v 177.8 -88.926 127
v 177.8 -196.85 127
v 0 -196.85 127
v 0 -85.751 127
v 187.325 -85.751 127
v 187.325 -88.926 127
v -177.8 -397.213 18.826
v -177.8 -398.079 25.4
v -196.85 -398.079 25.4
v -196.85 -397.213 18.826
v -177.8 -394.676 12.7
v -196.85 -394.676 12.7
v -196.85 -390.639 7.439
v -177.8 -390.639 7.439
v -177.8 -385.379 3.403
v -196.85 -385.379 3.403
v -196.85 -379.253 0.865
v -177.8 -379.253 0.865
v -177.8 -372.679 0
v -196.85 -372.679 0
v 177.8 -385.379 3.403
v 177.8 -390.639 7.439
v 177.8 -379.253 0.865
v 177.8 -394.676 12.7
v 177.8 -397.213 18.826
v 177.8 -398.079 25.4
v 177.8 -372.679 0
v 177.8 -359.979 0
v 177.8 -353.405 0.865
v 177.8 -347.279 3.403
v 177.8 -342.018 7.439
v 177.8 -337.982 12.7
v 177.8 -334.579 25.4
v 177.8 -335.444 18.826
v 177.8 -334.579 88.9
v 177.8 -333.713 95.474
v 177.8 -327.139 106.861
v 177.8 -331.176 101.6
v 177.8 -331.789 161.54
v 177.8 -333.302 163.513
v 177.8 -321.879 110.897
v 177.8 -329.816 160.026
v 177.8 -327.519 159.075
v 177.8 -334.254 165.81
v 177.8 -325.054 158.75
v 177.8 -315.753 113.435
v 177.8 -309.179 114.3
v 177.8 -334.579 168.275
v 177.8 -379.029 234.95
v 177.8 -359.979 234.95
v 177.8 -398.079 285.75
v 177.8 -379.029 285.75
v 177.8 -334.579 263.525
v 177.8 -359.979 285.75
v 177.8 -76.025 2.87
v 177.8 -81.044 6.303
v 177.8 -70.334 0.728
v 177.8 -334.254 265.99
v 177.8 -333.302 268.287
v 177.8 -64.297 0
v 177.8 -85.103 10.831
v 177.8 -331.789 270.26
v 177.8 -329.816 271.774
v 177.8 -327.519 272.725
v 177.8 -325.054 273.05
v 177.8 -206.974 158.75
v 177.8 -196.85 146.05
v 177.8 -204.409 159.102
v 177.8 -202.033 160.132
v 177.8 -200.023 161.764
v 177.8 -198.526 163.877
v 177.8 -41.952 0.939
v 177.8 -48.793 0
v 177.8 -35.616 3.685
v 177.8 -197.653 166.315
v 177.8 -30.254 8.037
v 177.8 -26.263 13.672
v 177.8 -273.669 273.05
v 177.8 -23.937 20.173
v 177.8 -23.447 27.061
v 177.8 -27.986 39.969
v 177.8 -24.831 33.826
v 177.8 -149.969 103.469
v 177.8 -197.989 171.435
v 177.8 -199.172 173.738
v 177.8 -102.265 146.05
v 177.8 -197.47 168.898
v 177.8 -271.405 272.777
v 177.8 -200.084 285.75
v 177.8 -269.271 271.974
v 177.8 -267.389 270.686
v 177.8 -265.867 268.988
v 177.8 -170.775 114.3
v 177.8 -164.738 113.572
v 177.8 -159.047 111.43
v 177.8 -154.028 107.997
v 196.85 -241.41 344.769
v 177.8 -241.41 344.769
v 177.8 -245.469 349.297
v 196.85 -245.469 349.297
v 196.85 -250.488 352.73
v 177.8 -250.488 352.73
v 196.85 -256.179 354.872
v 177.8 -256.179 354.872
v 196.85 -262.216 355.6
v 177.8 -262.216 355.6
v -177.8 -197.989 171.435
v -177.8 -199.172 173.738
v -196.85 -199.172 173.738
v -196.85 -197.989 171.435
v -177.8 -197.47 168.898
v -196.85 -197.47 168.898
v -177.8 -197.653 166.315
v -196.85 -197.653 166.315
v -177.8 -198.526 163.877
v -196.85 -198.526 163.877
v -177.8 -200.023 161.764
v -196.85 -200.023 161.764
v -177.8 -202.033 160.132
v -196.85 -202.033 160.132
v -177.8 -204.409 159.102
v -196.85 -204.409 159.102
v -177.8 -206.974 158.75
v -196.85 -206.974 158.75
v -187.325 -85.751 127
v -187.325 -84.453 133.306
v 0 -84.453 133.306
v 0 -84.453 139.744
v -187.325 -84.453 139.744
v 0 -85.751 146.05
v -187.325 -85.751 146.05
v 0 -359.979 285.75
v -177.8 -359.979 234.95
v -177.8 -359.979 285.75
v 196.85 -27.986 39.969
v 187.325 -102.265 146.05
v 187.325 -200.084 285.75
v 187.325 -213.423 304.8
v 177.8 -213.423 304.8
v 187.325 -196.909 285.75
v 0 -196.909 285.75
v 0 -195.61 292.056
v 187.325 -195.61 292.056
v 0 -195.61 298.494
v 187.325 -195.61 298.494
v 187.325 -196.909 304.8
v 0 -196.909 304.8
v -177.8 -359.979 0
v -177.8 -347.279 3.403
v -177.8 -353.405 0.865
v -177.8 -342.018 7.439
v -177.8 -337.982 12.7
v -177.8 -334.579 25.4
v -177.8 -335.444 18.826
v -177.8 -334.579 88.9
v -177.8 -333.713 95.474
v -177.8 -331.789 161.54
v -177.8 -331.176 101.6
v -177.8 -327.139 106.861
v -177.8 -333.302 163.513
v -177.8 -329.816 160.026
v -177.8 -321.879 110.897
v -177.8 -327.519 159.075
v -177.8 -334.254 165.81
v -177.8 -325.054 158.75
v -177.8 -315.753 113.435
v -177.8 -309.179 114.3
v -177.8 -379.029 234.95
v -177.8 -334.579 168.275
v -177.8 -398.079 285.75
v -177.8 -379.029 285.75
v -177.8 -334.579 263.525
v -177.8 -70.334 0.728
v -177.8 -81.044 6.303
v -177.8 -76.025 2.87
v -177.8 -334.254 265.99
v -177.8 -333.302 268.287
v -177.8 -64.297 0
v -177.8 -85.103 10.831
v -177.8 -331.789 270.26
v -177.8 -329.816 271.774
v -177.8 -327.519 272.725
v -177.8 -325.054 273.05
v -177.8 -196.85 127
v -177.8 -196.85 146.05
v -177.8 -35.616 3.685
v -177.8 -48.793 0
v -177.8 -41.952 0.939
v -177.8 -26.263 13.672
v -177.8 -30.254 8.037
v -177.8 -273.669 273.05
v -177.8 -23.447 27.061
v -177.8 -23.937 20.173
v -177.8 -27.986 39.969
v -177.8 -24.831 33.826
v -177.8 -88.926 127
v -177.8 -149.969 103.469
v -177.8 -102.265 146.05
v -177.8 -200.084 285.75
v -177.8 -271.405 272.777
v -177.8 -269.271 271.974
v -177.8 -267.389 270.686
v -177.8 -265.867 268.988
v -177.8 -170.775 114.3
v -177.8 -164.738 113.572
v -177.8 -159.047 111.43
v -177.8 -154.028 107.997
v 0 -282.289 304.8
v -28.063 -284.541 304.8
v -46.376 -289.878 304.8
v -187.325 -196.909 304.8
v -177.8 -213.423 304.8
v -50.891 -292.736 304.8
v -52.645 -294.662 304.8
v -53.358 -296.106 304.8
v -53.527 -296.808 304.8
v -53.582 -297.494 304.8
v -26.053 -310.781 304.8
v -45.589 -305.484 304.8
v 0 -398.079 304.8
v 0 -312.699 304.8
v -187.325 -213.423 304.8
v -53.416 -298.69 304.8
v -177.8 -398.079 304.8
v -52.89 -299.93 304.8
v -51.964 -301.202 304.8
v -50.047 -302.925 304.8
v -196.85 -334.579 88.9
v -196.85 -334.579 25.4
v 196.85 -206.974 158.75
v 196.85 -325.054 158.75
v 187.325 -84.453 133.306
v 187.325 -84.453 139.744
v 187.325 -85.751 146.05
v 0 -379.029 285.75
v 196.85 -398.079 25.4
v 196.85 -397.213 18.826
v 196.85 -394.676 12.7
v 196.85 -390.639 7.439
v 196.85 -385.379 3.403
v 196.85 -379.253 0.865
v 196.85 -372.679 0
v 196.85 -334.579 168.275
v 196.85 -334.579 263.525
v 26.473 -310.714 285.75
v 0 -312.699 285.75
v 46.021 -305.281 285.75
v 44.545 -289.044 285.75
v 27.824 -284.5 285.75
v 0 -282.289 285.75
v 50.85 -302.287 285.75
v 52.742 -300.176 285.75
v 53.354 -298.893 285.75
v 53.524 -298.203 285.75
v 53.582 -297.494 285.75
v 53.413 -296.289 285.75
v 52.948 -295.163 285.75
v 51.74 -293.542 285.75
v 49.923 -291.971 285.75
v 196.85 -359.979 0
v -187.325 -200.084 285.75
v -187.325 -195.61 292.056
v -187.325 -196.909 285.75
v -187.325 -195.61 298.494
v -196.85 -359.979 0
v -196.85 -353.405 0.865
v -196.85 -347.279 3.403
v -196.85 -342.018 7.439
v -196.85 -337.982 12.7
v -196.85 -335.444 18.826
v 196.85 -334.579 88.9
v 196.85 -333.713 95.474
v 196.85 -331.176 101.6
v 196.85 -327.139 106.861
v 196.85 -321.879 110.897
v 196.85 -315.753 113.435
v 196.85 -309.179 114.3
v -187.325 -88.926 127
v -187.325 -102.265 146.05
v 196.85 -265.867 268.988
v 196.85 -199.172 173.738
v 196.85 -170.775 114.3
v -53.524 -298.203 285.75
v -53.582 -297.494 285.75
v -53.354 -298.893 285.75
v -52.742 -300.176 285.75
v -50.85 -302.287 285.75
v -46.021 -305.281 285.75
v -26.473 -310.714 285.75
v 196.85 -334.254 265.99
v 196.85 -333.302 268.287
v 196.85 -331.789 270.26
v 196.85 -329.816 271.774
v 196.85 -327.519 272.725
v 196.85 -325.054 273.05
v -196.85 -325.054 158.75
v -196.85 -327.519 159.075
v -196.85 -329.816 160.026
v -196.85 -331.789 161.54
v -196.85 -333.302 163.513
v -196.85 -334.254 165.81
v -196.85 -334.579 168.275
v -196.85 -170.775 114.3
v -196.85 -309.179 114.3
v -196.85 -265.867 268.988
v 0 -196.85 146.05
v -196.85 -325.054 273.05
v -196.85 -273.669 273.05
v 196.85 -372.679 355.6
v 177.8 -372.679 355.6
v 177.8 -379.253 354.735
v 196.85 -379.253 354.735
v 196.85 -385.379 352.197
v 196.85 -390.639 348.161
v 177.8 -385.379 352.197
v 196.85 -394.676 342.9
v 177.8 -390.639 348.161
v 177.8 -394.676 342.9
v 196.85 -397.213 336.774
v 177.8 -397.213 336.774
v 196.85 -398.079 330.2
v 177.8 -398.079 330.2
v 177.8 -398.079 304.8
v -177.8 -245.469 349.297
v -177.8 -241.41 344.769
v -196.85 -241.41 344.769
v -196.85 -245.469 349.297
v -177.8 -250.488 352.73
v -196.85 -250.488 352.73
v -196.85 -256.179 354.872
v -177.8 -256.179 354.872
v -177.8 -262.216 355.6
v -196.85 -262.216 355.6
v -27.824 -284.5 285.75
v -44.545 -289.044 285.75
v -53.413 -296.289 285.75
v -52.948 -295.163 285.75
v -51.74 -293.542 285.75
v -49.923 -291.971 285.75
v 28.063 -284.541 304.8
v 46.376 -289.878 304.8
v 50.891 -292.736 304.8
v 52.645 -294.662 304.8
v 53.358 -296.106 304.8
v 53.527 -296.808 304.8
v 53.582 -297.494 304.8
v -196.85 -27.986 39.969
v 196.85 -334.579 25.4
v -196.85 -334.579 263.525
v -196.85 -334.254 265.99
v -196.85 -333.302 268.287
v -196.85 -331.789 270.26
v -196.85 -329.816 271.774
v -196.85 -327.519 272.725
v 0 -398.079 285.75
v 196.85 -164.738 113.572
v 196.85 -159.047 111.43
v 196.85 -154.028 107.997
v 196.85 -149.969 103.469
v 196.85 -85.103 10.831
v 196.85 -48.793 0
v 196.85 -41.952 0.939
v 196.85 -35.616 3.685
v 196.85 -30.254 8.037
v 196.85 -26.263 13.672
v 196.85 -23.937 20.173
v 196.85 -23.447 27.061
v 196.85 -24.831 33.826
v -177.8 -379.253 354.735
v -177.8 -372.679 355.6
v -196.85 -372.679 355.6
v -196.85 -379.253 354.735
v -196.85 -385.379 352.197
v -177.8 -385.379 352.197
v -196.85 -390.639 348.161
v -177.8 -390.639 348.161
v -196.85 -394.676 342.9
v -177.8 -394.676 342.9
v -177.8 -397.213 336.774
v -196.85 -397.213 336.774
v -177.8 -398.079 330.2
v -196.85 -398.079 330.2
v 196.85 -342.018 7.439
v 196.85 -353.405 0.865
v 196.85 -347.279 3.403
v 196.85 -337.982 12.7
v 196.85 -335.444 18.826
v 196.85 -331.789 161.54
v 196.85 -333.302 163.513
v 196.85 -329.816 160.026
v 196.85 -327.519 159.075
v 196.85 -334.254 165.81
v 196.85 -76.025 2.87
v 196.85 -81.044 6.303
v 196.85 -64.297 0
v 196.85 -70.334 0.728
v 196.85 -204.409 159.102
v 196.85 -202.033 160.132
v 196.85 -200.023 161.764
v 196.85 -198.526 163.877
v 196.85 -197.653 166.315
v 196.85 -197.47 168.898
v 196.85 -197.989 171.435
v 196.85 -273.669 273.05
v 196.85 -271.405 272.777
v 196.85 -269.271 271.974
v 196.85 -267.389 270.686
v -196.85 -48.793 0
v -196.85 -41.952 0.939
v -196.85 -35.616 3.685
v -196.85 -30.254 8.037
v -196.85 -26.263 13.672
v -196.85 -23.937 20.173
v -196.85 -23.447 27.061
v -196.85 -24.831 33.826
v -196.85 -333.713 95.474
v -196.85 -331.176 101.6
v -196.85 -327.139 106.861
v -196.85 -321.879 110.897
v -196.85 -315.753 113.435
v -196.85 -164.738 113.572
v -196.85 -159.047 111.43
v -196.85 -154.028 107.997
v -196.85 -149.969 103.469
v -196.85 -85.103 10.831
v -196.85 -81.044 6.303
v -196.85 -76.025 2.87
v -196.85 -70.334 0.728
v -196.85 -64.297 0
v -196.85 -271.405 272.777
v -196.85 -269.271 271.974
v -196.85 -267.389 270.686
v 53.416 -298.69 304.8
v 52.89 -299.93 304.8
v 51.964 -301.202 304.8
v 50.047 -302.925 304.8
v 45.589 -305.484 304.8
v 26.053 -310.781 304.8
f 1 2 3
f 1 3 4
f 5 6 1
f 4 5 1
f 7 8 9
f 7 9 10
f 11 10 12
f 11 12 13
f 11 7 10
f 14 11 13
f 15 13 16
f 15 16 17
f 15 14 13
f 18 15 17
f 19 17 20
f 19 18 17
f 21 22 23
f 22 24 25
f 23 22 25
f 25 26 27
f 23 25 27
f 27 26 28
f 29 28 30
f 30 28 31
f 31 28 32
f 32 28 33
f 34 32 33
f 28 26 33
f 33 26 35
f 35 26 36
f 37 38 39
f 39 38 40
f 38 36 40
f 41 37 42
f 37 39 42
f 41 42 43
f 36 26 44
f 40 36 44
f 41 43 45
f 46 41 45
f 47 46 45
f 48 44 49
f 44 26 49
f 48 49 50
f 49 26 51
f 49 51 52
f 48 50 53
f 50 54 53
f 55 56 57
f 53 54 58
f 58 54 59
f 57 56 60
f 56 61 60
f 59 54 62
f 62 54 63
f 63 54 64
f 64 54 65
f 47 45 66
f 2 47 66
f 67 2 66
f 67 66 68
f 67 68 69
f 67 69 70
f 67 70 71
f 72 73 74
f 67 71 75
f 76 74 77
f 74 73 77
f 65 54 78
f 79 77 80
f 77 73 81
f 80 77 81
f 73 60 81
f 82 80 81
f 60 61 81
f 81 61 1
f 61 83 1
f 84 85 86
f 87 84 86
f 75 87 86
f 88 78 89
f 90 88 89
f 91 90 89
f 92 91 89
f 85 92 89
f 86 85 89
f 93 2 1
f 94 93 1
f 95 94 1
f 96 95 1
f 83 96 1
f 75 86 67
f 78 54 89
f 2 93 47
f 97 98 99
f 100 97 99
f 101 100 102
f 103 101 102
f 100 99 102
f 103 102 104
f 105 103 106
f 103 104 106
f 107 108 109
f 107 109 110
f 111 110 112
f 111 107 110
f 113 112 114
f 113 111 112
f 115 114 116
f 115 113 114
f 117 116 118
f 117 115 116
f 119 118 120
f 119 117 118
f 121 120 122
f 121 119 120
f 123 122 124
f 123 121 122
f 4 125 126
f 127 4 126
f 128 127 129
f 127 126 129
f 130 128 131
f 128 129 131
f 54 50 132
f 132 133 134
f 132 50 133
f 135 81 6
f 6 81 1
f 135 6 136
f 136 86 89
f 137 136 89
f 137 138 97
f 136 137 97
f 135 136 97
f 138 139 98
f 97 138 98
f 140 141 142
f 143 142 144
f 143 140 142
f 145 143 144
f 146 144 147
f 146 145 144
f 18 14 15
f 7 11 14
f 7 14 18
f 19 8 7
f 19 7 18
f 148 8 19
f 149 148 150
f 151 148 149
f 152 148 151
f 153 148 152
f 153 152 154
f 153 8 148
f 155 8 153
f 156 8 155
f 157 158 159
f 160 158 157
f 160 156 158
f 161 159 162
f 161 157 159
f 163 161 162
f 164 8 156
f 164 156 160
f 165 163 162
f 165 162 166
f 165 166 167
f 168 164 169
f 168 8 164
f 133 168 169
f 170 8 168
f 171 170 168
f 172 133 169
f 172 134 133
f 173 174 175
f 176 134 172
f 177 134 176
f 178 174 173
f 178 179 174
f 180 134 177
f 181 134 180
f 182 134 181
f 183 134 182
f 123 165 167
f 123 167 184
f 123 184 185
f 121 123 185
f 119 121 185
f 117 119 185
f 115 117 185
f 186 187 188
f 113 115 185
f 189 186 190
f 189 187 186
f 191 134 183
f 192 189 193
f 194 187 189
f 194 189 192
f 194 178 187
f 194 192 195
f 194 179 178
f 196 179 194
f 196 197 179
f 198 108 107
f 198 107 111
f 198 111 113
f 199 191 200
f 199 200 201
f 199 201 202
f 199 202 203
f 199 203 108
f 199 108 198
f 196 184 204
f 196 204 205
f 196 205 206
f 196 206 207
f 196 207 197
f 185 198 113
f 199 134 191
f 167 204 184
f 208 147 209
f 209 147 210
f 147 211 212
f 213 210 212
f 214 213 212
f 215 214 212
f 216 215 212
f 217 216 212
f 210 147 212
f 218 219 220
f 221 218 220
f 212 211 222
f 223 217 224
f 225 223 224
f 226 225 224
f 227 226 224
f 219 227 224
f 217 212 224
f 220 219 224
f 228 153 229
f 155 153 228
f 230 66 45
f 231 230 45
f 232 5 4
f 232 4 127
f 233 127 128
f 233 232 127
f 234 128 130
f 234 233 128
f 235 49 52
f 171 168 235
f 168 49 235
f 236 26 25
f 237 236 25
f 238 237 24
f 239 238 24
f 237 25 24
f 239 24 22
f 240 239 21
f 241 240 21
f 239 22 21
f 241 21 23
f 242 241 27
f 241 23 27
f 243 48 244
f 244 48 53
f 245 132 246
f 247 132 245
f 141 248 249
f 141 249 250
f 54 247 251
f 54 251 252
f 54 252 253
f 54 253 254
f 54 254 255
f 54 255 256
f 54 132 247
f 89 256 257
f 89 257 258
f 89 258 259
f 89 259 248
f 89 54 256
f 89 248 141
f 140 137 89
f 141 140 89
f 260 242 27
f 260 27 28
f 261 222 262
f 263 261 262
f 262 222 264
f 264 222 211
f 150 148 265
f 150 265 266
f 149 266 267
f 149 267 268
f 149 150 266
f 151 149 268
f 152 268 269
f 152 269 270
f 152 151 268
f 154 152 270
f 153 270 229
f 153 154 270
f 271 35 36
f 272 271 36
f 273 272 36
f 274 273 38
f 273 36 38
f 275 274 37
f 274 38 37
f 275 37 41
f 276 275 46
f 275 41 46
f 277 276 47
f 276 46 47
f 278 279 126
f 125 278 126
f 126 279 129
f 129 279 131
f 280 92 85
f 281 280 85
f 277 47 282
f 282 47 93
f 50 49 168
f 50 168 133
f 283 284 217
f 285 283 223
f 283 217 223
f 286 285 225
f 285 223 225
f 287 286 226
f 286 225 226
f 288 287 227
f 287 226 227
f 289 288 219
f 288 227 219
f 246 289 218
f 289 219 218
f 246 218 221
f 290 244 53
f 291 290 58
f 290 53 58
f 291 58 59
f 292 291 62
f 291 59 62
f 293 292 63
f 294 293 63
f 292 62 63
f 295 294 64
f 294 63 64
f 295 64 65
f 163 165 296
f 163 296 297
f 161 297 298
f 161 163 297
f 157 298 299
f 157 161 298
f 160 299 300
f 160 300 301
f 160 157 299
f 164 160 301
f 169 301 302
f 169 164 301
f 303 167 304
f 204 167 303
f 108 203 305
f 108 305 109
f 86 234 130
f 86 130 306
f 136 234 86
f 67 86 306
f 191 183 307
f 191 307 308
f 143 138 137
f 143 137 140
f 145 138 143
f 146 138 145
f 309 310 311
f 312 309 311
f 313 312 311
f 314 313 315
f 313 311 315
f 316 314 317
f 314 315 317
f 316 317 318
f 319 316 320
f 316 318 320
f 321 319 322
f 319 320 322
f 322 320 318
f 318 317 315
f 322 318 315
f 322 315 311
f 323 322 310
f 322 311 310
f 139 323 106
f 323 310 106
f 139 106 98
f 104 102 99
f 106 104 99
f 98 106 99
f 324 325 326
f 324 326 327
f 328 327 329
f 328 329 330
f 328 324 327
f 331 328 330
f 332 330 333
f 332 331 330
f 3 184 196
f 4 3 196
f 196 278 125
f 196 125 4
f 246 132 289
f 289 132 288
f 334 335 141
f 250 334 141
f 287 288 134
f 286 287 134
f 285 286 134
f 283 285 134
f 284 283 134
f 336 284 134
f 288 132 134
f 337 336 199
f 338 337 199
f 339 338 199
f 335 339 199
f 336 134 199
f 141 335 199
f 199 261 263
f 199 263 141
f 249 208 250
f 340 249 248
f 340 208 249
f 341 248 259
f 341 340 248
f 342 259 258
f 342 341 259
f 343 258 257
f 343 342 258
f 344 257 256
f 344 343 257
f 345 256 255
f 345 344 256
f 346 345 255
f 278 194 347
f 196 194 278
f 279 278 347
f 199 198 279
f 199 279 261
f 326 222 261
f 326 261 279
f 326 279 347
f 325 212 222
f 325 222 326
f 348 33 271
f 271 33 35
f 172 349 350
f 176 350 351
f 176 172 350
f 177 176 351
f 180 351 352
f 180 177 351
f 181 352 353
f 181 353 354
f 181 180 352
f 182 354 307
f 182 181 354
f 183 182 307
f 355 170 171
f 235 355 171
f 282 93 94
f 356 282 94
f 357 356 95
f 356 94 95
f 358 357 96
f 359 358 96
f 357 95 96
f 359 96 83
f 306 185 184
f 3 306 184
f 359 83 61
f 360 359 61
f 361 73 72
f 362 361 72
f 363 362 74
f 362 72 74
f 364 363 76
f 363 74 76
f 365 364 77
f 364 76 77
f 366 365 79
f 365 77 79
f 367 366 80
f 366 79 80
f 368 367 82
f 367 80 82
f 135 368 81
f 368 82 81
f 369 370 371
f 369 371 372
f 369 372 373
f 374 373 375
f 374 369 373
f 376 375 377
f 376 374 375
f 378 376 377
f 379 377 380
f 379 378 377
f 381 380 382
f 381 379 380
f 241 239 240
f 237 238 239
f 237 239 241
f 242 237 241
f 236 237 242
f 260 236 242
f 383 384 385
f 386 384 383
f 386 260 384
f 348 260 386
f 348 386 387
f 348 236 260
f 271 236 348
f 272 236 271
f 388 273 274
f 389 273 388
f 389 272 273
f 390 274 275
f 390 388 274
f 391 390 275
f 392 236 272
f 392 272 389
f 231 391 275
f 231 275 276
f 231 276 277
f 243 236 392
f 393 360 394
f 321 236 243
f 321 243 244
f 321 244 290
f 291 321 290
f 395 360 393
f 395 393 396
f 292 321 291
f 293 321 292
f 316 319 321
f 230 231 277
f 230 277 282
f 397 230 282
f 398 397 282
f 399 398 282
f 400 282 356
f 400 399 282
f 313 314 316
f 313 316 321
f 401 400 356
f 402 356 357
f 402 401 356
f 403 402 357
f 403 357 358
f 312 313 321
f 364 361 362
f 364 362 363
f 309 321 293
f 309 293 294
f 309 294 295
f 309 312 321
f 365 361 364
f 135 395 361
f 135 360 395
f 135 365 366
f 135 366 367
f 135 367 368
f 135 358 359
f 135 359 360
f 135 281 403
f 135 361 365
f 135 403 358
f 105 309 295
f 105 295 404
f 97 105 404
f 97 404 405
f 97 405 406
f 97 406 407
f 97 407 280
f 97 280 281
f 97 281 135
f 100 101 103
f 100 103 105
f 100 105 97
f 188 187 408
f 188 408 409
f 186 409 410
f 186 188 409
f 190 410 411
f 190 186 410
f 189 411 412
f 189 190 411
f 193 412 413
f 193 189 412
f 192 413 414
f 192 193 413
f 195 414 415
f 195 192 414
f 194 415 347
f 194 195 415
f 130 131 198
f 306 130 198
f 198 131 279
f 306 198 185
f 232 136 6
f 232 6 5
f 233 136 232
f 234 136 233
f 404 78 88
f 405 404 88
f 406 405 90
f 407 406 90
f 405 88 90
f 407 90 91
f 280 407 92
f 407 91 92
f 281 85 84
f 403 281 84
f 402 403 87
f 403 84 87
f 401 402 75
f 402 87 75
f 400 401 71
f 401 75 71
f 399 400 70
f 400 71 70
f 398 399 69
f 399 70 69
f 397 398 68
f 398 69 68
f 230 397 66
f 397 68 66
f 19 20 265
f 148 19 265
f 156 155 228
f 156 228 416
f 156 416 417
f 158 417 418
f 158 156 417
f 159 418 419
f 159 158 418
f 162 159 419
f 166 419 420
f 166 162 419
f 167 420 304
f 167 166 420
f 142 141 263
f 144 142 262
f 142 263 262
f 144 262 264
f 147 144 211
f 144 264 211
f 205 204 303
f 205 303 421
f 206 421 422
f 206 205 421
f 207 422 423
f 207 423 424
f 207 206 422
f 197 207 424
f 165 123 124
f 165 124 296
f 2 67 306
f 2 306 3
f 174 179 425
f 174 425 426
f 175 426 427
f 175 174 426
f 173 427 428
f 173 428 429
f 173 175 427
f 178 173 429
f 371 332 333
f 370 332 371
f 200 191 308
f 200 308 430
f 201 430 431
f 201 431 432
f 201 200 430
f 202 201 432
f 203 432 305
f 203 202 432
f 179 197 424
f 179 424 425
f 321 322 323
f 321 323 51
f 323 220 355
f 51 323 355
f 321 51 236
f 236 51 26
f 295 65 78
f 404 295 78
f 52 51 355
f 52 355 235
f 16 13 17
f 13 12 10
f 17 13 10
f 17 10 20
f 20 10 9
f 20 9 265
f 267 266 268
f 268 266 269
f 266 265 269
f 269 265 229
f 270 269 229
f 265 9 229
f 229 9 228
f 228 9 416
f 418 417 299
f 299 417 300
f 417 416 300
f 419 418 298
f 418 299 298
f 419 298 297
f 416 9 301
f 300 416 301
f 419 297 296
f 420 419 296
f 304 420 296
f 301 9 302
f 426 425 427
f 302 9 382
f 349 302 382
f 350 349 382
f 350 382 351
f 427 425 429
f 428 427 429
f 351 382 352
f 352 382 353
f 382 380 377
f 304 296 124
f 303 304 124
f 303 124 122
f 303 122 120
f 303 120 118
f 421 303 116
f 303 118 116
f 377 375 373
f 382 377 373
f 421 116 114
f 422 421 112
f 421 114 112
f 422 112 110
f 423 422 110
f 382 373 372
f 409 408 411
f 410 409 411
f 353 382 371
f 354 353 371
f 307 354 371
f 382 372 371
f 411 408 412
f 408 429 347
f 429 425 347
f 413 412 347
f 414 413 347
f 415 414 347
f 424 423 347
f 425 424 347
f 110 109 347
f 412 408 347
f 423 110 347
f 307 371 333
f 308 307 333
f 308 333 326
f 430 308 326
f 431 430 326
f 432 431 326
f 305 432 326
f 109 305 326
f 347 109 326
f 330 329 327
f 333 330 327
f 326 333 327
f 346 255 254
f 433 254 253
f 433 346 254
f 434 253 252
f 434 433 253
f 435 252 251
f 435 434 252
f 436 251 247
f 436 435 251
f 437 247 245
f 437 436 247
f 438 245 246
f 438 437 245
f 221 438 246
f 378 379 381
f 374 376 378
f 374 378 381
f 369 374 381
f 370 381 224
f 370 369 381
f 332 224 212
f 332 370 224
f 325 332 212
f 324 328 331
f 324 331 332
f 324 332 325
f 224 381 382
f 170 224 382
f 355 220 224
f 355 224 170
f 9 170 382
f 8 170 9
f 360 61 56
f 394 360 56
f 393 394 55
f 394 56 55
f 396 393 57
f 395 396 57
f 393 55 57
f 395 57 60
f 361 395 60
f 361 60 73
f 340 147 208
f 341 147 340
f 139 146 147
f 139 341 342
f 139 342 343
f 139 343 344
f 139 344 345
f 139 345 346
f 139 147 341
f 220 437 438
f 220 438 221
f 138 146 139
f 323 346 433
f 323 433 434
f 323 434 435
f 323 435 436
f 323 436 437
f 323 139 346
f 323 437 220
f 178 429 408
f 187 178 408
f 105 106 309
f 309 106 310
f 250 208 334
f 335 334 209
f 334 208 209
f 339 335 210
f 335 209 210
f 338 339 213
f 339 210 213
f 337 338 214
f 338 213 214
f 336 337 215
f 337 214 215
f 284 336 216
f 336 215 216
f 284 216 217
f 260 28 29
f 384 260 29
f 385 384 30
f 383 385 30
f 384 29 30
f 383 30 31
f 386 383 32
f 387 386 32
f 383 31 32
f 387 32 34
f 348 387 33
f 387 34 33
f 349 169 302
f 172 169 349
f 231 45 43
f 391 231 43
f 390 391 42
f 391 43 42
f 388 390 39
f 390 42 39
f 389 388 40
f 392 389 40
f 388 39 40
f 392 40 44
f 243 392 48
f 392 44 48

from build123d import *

# Parameters (mm, degrees)
F2_DEPTH  = 19.05
F3_W      = 9.525
F3_H      = 19.05
F4_DEPTH  = 223.52
F5_W      = 9.525
F5_H      = 19.05
F6_DEPTH  = 196.85
F8_DEPTH  = 187.325
F10_DEPTH = 25.4
F12_W     = 19.05
F12_H     = 50.8
F13_DEPTH = 355.6


with BuildPart() as f2:
    # F1 (on offset) → F2 (new body)
    with BuildSketch(Plane.YZ.offset(-177.8)):
        with BuildLine():
            Line((-64.2967833023, 0), (-48.7929460251, 0))
            ThreePointArc((-48.7929460251, 0), (-26.2628708623, 13.6715852238), (-27.9864841001, 39.9688414833))
            Line((-27.9864841001, 39.9688414833), (-241.4097417464, 344.7688414833))
            ThreePointArc((-241.4097417464, 344.7688414833), (-250.4877888952, 352.7300751627), (-262.2162036714, 355.6))
            Line((-262.2162036714, 355.6), (-372.678573608, 355.6))
            ThreePointArc((-372.678573608, 355.6), (-390.6390858501, 348.1605122421), (-398.078573608, 330.2))
            Line((-398.078573608, 330.2), (-398.078573608, 25.4))
            ThreePointArc((-398.078573608, 25.4), (-390.6390858501, 7.4394877579), (-372.678573608, 0))
            Line((-372.678573608, 0), (-359.978573608, 0))
            ThreePointArc((-359.978573608, 0), (-342.0180613659, 7.4394877579), (-334.578573608, 25.4))
            Line((-334.578573608, 25.4), (-334.578573608, 88.9))
            ThreePointArc((-334.578573608, 88.9), (-327.1390858501, 106.8605122421), (-309.178573608, 114.3))
            Line((-309.178573608, 114.3), (-170.7753110877, 114.3))
            ThreePointArc((-170.7753110877, 114.3), (-159.0468963116, 111.4300751627), (-149.9688491628, 103.4688414833))
            Line((-149.9688491628, 103.4688414833), (-85.1032452273, 10.8311585167))
            ThreePointArc((-85.1032452273, 10.8311585167), (-76.0251980785, 2.8699248373), (-64.2967833023, 0))
        make_face()
        with BuildLine():
            Line((-334.578573608, 168.275), (-334.578573608, 263.525))
            ThreePointArc((-334.578573608, 263.525), (-331.7887656988, 270.2601920908), (-325.053573608, 273.05))
            Line((-325.053573608, 273.05), (-273.669255851, 273.05))
            ThreePointArc((-273.669255851, 273.05), (-269.27110031, 271.973778186), (-265.8668326292, 268.9883155562))
            Line((-265.8668326292, 268.9883155562), (-199.1720646147, 173.7383155562))
            ThreePointArc((-199.1720646147, 173.7383155562), (-198.5257096505, 163.8768444589), (-206.9744878365, 158.75))
            Line((-206.9744878365, 158.75), (-325.053573608, 158.75))
            ThreePointArc((-325.053573608, 158.75), (-331.7887656988, 161.5398079092), (-334.578573608, 168.275))
        make_face(mode=Mode.SUBTRACT)
    extrude(amount=-F2_DEPTH)

    # F3 (on face) → F4 (cut)
    with BuildSketch(Plane.XZ.offset(398.078573608)):
        with Locations((-182.5625, 295.275)):
            Rectangle(F3_W, F3_H)
    extrude(amount=-F4_DEPTH, mode=Mode.SUBTRACT)

    # F5 (on Front) → F6 (cut)
    with BuildSketch(Plane.XZ):
        with Locations((-182.5625, 136.525)):
            Rectangle(F5_W, F5_H)
    extrude(amount=F6_DEPTH, mode=Mode.SUBTRACT)

    # F7 (on face) → F8 (join, through all)
    with BuildSketch(Plane.YZ.offset(-187.325)):
        with BuildLine():
            Line((-88.9263573526, 146.05), (-102.2653109555, 146.05))
            Line((-102.2653109555, 146.05), (-196.85, 146.05))
            Line((-196.85, 146.05), (-196.85, 127))
            Line((-196.85, 127), (-88.9263573526, 127))
            Line((-88.9263573526, 127), (-85.7513573526, 127))
            ThreePointArc((-85.7513573526, 127), (-84.2889269976, 136.525), (-85.7513573526, 146.05))
            Line((-85.7513573526, 146.05), (-88.9263573526, 146.05))
        make_face()
        Polygon((-200.0843040434, 285.75), (-213.4232576463, 304.8), (-398.078573608, 304.8), (-398.078573608, 285.75), align=None)
        with BuildLine():
            Line((-196.9093040434, 304.8), (-213.4232576463, 304.8))
            Line((-213.4232576463, 304.8), (-200.0843040434, 285.75))
            Line((-200.0843040434, 285.75), (-196.9093040434, 285.75))
            ThreePointArc((-196.9093040434, 285.75), (-195.4468736884, 295.275), (-196.9093040434, 304.8))
        make_face()
    extrude(amount=F8_DEPTH)

    # F9 (on face) → F10 (cut)
    with BuildSketch(Plane.XY.offset(304.8)):
        with BuildLine():
            add(Edge.make_bspline(
                [(-53.5818748176, -297.4939388257), (-53.5818748176, -323.8300075914), (26.7909374088, -310.6619732086), (107.1637496352, -297.4939388257), (26.7909374088, -284.3259044429), (-53.5818748176, -271.15787006), (-53.5818748176, -297.4939388257)],
                knots=[0, 0, 0, 2.0943951024, 2.0943951024, 4.1887902048, 4.1887902048, 6.2831853072, 6.2831853072, 6.2831853072], degree=2, weights=[1, 0.5, 1, 0.5, 1, 0.5, 1]))
        make_face()
    extrude(amount=-F10_DEPTH, mode=Mode.SUBTRACT)

    # F11: F2 across plane


with BuildPart() as f2_1:
    add(f2.part)
    add(f2.part.mirror(Plane.YZ))

    # F12 (on face) → F13 (join, through all)
    with BuildSketch(Plane.YZ.offset(-177.8)):
        with Locations((-369.503573608, 260.35)):
            Rectangle(F12_W, F12_H)
    extrude(amount=F13_DEPTH)

    # F14: F2 across plane


with BuildPart() as f2_2:
    add(f2_1.part)
    add(f2_1.part.mirror(Plane.YZ))


solid = f2_2.part
